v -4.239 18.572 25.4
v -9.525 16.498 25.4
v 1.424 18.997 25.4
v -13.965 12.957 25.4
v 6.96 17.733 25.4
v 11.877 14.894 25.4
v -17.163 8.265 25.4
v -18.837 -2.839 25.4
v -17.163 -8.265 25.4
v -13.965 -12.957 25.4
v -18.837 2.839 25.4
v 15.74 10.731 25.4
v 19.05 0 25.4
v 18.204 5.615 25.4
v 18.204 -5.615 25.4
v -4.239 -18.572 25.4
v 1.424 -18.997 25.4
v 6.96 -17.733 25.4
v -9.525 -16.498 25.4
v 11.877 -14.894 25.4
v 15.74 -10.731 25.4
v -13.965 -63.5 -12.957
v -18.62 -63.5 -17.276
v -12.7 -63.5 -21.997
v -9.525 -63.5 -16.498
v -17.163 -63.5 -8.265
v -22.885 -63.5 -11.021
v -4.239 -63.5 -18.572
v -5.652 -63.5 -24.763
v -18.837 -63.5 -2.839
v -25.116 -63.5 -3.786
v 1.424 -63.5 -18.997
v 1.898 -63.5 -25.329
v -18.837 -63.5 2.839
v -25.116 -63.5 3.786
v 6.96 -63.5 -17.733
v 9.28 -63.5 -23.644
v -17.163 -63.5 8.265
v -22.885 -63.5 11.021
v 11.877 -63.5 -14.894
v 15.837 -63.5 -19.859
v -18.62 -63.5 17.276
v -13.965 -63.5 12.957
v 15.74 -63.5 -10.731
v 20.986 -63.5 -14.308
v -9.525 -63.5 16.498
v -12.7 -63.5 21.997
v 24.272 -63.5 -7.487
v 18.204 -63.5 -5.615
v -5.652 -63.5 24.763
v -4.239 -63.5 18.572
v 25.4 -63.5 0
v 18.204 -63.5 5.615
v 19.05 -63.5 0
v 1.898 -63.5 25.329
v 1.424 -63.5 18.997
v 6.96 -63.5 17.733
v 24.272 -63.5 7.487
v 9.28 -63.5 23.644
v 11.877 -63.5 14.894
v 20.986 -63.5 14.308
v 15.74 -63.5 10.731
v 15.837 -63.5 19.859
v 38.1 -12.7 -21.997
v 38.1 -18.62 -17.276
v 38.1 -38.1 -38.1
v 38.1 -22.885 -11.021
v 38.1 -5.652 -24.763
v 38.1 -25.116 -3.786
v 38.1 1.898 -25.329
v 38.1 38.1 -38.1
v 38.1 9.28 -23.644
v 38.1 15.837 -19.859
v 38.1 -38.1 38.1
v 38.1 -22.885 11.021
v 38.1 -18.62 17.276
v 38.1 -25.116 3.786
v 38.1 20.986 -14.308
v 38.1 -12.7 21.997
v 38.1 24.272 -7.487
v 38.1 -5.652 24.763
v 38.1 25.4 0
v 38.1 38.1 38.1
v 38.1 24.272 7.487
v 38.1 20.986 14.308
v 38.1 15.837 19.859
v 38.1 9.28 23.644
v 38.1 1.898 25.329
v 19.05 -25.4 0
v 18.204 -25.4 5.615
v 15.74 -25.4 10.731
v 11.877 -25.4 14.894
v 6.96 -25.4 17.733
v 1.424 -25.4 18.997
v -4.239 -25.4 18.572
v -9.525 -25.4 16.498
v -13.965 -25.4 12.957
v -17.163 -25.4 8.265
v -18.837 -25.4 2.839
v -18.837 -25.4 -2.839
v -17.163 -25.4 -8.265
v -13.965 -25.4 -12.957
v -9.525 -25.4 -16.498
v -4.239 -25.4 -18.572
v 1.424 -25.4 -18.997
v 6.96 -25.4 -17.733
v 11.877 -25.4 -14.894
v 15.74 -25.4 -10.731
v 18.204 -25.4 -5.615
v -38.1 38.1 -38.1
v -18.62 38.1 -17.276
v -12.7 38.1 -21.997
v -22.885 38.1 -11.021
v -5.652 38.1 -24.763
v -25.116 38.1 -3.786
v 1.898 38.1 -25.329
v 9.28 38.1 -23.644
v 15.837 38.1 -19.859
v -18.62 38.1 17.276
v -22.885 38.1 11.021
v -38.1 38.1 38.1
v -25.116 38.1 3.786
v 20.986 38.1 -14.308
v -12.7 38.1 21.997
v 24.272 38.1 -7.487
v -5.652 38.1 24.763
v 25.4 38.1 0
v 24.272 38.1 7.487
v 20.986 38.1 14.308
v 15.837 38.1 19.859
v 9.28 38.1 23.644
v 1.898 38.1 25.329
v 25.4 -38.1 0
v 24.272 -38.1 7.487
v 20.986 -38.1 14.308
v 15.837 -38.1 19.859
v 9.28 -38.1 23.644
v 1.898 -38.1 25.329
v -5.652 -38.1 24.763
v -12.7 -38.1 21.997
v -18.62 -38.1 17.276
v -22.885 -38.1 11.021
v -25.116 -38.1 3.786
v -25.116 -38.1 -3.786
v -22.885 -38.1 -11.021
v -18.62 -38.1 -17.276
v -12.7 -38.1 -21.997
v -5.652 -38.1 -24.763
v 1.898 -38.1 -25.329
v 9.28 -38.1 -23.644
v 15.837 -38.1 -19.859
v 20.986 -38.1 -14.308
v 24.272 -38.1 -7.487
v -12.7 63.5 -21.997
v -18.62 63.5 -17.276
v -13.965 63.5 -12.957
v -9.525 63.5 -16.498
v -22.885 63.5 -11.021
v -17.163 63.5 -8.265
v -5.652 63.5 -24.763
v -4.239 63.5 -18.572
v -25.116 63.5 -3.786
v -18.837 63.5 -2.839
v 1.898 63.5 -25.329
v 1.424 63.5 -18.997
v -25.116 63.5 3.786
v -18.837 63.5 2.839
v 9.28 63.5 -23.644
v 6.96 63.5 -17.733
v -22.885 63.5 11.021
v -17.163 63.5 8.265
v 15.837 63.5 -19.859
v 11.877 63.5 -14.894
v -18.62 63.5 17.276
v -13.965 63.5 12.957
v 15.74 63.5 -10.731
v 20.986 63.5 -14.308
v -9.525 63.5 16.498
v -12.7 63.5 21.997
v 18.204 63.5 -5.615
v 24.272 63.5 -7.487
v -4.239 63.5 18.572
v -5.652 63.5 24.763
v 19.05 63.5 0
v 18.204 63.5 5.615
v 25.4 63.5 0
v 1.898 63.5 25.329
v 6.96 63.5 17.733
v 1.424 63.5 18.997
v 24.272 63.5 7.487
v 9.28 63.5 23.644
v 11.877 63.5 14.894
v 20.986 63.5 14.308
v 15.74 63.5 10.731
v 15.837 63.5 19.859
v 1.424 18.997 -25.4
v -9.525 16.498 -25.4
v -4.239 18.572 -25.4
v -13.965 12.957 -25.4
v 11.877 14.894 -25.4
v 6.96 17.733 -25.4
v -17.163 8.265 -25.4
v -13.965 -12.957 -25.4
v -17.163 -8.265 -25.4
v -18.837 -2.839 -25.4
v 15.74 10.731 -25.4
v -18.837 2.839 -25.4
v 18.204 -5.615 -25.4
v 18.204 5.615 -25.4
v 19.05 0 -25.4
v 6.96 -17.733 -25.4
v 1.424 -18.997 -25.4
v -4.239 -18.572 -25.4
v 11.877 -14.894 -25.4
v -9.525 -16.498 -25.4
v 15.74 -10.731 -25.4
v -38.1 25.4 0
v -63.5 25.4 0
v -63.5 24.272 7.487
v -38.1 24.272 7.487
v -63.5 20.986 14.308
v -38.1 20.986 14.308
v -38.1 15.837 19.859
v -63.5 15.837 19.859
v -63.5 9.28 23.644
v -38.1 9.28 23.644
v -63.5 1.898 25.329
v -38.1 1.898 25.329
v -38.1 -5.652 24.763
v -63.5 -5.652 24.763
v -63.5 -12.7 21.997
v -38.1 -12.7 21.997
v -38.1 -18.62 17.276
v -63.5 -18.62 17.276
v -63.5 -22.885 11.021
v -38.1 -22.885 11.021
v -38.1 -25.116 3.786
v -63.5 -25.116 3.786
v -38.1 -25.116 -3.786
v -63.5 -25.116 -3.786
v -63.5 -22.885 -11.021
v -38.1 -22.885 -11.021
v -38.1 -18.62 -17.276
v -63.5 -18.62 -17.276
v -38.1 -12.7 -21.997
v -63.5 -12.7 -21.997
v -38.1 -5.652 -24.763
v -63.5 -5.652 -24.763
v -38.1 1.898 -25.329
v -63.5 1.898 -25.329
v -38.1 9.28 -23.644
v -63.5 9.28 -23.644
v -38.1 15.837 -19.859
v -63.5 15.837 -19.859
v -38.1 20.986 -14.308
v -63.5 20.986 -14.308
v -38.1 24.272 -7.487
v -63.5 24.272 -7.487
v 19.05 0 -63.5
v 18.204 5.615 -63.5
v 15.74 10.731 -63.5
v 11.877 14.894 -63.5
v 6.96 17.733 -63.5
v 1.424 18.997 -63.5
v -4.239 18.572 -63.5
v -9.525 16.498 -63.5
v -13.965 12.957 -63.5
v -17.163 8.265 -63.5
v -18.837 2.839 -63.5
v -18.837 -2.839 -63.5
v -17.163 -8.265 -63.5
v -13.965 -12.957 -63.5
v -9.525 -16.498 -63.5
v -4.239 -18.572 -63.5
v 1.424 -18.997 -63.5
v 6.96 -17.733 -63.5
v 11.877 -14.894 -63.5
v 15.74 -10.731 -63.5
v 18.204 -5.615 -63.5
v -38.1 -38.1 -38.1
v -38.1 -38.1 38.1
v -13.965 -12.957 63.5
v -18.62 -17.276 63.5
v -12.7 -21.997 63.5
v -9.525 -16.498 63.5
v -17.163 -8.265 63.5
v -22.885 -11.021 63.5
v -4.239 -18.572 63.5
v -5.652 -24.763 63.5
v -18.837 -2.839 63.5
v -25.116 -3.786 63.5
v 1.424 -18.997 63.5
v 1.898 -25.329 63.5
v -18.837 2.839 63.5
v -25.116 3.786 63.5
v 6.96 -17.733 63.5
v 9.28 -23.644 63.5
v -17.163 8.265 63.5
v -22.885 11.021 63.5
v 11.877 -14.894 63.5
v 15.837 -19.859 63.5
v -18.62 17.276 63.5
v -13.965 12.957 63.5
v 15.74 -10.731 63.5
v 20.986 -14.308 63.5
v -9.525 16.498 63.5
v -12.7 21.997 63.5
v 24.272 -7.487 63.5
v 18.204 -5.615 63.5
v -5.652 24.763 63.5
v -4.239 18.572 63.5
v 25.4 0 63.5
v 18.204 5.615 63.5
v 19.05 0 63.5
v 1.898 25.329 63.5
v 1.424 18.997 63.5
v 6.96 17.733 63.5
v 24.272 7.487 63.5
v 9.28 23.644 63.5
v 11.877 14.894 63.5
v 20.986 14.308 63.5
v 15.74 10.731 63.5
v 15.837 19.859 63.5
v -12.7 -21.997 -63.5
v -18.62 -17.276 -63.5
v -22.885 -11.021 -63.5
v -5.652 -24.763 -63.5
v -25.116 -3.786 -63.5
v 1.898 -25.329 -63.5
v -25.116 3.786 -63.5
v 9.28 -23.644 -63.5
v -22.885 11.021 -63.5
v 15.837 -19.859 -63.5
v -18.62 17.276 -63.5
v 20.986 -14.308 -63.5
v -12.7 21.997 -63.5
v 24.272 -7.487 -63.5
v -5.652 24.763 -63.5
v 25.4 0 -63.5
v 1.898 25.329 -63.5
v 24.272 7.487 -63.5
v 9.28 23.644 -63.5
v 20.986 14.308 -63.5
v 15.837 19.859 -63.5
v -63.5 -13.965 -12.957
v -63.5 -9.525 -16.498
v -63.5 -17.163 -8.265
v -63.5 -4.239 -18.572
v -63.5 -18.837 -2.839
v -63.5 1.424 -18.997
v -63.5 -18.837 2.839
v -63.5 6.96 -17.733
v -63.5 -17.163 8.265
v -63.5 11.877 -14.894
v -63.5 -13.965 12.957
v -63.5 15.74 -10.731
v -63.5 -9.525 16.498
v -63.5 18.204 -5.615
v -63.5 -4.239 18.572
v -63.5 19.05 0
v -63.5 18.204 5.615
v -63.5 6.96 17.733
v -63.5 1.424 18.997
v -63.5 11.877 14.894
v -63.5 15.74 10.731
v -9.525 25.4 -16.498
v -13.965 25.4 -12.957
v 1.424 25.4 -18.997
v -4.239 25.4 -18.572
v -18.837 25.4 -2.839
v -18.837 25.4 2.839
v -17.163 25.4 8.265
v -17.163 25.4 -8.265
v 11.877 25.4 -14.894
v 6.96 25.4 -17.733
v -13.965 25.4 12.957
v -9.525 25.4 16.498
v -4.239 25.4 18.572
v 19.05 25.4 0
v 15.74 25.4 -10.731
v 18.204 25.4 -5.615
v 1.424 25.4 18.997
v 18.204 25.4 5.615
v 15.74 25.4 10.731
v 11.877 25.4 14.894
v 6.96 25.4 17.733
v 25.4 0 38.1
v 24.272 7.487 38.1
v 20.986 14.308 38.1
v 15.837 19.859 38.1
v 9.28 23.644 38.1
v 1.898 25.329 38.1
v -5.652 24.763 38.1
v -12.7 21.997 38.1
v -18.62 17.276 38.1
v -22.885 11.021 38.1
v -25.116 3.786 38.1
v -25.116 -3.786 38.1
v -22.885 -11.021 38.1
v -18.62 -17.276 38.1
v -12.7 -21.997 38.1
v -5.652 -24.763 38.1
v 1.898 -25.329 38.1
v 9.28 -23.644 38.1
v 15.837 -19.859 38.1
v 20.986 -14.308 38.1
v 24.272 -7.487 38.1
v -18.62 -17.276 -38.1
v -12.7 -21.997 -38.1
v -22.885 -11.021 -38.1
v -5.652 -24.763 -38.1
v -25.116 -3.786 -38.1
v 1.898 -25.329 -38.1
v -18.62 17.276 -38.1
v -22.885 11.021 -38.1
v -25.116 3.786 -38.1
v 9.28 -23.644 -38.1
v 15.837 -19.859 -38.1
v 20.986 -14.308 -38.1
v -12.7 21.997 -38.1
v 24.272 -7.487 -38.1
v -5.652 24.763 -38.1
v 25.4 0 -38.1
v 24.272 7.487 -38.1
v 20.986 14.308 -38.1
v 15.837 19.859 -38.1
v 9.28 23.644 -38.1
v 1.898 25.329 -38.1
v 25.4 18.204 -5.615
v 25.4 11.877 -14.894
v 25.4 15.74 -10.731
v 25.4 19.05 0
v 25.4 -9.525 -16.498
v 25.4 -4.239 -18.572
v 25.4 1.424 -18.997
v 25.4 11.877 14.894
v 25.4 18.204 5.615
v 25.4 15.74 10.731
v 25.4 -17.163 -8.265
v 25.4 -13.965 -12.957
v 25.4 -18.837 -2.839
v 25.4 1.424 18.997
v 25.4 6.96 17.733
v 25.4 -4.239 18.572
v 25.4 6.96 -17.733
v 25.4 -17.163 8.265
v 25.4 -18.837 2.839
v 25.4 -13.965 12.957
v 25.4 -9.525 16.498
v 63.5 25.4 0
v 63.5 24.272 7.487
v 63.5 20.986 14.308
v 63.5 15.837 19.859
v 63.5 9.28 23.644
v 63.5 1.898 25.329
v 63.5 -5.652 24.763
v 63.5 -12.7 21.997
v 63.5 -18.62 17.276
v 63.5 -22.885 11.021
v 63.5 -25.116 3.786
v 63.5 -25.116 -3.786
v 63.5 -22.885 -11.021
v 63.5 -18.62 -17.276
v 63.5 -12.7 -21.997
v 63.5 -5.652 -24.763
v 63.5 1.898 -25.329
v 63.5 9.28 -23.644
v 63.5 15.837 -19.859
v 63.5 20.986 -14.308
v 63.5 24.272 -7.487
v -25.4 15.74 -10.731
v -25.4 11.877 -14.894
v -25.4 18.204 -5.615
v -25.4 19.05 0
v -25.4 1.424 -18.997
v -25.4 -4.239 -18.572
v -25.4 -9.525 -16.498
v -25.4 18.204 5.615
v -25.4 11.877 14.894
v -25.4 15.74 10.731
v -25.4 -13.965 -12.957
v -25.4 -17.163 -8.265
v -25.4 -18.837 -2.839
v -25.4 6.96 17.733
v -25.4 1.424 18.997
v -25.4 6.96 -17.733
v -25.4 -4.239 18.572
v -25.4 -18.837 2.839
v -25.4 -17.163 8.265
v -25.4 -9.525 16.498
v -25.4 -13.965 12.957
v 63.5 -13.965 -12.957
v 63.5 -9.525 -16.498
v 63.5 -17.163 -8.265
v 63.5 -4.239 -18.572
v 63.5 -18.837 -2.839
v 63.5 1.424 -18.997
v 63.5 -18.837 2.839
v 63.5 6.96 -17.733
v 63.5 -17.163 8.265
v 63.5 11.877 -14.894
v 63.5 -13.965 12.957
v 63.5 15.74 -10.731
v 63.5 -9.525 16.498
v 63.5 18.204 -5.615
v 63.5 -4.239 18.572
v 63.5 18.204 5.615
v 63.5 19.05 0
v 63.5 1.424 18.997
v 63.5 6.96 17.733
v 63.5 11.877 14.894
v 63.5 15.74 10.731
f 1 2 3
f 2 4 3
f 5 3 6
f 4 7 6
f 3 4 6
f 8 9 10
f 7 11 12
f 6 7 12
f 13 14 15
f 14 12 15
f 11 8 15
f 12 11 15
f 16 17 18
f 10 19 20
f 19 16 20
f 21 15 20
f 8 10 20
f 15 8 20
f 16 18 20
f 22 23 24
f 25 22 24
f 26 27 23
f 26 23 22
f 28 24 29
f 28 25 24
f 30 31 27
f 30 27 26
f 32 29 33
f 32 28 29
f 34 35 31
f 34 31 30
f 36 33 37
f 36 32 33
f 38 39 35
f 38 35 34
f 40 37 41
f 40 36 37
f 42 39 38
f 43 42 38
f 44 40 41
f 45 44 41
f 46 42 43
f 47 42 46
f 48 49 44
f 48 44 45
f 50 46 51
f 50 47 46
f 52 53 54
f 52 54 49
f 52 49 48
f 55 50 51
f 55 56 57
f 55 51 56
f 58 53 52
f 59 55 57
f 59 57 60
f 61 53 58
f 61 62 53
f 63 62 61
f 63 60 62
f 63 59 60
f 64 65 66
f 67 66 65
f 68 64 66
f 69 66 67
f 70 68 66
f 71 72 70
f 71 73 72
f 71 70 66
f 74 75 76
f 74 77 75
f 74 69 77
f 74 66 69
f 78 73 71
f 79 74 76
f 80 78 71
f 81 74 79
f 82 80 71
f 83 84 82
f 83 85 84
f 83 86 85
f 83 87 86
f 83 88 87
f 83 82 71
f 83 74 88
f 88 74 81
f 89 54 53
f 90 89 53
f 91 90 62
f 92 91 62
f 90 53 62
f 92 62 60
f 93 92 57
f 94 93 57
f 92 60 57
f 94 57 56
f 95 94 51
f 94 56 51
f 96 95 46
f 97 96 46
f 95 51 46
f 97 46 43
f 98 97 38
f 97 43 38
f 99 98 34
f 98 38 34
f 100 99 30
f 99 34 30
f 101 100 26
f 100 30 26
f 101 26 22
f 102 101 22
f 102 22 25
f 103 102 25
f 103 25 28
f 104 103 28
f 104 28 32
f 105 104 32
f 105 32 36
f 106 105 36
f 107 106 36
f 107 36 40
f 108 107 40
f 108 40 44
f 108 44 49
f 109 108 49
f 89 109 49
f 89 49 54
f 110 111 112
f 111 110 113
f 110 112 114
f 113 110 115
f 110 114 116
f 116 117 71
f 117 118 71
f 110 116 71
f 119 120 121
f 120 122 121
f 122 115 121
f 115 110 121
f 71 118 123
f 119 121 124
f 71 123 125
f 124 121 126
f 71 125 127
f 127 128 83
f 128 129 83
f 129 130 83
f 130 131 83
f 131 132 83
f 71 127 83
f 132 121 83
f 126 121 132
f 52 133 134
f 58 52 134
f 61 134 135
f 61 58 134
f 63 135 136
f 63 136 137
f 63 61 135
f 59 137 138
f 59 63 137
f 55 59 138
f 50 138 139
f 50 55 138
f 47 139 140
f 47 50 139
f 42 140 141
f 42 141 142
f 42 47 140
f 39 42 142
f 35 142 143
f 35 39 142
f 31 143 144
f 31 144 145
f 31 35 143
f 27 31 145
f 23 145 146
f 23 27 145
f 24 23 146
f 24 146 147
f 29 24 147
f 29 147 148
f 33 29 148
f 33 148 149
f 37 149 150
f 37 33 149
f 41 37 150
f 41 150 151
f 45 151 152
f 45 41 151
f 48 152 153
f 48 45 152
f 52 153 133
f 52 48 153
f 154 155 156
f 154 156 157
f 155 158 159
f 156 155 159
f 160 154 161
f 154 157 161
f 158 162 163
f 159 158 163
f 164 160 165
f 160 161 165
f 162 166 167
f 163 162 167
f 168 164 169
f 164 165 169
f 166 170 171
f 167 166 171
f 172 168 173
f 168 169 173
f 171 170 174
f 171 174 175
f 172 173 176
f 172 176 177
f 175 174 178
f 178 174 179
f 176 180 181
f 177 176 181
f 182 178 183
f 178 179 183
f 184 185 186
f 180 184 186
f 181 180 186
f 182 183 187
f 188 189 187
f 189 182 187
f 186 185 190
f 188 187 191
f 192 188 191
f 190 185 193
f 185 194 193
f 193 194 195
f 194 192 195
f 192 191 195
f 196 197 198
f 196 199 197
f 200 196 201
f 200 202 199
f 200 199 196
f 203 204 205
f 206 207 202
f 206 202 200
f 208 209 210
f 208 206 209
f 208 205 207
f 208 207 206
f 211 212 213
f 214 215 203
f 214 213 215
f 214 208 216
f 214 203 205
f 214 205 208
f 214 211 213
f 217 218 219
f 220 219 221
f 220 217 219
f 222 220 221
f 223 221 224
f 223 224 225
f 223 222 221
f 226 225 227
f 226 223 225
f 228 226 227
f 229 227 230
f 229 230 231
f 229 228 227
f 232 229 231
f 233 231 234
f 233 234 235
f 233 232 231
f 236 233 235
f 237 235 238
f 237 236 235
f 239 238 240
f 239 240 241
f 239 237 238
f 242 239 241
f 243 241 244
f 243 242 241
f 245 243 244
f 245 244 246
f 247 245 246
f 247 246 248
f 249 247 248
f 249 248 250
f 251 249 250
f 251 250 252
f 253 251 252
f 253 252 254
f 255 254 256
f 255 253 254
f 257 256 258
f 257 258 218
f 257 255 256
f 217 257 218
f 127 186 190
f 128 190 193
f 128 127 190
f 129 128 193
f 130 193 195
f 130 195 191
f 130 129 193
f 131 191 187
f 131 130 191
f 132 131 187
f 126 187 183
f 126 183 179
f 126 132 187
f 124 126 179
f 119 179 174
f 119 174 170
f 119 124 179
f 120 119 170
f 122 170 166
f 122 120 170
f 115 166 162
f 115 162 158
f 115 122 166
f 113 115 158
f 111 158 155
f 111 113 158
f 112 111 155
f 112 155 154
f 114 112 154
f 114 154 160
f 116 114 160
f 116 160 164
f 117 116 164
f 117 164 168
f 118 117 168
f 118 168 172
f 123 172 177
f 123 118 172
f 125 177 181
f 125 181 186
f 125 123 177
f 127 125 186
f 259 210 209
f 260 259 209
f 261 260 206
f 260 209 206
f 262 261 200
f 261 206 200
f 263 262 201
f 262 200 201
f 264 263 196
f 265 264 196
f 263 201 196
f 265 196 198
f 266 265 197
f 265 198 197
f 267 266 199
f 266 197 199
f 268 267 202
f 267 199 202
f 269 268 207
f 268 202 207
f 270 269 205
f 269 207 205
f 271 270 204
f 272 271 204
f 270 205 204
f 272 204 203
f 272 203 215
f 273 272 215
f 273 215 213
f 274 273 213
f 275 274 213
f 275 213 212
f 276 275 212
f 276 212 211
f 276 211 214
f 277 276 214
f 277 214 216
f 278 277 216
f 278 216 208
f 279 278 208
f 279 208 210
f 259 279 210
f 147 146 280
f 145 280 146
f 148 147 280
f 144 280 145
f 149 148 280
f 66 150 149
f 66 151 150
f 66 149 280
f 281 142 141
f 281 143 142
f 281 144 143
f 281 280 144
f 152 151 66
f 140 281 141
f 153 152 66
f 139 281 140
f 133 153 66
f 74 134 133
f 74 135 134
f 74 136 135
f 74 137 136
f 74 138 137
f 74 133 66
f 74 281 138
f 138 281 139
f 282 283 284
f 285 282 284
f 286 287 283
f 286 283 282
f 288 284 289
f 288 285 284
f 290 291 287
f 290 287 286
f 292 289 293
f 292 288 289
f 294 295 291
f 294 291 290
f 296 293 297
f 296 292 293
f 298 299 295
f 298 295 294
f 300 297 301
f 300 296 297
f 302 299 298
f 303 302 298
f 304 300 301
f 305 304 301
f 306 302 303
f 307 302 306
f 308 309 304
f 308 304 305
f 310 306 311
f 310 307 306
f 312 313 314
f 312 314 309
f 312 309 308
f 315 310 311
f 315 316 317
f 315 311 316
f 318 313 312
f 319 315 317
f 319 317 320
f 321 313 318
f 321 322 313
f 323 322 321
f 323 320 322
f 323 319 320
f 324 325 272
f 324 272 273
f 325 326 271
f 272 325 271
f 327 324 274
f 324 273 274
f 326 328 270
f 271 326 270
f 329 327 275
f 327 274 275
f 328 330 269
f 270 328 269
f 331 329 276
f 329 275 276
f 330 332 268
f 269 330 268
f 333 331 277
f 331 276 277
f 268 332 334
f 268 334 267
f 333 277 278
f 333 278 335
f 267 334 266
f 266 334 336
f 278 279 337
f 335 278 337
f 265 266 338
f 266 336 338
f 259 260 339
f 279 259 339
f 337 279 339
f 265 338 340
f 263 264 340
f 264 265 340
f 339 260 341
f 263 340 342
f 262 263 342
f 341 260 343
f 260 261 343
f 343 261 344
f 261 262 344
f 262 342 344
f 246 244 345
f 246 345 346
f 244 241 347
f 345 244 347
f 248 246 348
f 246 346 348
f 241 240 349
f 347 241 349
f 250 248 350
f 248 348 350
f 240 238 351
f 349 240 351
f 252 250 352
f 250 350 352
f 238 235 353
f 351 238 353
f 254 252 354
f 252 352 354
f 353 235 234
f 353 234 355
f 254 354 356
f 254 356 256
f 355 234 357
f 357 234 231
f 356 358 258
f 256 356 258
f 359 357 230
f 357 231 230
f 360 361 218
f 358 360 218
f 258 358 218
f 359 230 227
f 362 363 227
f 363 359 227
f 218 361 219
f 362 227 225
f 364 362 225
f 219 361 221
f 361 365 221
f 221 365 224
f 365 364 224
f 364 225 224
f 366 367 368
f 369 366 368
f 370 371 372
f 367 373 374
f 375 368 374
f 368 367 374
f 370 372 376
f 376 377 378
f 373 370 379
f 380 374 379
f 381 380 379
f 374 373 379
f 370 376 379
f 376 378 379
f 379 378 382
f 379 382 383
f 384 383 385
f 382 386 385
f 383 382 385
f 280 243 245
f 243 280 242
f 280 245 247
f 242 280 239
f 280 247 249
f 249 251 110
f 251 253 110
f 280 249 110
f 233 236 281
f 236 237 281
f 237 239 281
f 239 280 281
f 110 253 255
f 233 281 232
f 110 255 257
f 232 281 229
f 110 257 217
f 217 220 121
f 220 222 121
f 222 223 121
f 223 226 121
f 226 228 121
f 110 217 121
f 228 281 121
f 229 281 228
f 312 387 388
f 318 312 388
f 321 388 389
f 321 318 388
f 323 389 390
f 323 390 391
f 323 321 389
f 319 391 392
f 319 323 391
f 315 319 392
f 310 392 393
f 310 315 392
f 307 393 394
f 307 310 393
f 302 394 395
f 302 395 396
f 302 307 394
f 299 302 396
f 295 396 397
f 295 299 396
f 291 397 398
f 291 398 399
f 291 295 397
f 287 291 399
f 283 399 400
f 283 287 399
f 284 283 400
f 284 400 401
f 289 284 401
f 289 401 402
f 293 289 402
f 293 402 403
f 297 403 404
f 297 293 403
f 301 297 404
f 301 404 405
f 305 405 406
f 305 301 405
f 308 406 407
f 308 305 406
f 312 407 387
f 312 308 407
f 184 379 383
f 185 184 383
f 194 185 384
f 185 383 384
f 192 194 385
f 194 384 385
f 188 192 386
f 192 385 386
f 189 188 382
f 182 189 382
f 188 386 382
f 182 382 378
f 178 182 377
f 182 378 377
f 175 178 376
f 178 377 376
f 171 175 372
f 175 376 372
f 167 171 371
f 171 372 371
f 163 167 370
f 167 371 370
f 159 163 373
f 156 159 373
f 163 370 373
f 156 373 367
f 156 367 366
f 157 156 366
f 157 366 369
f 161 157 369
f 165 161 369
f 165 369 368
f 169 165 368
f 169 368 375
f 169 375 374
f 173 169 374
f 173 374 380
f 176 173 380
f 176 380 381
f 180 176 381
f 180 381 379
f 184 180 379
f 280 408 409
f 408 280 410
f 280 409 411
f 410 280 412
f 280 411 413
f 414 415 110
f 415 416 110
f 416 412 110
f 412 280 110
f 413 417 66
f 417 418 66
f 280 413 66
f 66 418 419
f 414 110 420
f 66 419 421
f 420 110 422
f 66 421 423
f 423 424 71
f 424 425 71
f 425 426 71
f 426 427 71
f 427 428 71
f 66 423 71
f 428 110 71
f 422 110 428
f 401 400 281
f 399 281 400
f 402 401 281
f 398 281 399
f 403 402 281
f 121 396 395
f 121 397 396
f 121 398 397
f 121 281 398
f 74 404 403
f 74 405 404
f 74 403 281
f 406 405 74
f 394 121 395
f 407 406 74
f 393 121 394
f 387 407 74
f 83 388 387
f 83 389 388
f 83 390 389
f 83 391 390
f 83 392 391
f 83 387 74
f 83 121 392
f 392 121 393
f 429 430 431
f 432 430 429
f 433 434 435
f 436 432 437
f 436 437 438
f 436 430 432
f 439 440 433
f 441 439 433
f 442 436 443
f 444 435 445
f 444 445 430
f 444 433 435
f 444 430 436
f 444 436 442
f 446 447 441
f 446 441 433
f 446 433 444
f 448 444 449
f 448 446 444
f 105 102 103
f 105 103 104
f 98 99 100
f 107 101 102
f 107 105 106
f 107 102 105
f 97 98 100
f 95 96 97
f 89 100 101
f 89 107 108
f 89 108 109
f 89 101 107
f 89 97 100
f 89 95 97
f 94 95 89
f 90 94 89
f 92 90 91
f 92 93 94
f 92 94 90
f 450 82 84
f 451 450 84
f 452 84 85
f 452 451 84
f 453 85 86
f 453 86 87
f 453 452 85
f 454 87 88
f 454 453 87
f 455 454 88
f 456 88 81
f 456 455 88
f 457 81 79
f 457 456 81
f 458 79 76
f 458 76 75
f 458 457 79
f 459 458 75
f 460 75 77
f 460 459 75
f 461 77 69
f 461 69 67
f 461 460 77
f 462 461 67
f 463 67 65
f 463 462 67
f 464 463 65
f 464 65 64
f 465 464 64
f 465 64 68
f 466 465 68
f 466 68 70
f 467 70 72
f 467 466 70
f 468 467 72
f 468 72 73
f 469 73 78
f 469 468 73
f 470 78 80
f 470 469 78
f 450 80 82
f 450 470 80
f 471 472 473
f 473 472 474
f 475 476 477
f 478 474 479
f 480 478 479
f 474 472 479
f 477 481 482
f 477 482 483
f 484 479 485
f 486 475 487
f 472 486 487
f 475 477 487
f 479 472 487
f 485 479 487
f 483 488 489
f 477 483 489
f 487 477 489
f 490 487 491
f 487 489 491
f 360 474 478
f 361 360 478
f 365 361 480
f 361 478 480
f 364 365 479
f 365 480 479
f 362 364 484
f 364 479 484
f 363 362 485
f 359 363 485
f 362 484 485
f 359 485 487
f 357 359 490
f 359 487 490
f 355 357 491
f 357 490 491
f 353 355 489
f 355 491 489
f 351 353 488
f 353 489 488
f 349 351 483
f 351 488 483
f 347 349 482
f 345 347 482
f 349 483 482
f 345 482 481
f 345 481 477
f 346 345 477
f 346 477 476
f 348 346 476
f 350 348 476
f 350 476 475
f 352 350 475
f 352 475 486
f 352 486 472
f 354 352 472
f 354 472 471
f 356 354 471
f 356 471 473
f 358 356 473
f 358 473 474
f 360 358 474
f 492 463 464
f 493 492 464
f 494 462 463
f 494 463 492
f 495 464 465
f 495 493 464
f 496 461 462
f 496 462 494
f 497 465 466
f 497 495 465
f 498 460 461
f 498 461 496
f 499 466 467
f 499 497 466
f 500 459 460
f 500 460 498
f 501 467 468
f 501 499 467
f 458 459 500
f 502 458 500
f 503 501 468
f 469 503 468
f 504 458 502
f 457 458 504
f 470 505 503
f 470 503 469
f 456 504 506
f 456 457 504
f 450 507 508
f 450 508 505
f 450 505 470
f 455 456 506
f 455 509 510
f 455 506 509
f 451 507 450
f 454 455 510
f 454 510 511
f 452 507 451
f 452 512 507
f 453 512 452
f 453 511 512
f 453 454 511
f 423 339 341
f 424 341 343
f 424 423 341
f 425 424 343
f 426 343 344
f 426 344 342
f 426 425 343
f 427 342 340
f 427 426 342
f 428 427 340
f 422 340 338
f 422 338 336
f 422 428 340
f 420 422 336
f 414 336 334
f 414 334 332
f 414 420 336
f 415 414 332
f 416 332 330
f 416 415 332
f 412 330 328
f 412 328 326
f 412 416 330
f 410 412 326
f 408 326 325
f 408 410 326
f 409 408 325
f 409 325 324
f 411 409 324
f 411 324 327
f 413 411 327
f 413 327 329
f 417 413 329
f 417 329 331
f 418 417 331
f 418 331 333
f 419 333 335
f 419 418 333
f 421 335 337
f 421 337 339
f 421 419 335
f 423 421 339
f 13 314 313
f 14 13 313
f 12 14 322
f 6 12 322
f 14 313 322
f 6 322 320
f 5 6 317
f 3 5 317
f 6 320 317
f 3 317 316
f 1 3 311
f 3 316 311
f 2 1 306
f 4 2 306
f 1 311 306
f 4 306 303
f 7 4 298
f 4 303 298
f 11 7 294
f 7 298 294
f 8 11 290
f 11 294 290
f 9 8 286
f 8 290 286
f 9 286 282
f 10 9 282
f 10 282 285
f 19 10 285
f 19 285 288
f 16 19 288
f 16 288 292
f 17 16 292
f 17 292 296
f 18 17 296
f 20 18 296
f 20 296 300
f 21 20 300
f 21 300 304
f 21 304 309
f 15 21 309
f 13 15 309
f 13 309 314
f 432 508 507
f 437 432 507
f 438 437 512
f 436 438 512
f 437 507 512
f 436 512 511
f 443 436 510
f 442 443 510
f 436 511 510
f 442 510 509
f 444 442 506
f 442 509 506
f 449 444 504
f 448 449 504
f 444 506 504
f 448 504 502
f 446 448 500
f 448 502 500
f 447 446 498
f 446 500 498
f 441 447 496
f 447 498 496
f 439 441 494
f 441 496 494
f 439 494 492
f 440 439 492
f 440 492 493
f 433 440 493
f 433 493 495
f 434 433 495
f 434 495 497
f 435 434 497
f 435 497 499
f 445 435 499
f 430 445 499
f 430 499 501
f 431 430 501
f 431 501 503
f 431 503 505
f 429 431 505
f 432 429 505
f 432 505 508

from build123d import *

# Parameters (mm, degrees)
F0_W      = 76.2
F0_H      = 76.2
F0_R      = 25.4
F1_DEPTH  = 38.1
F2_DEPTH  = 63.5
F3_R      = 25.4
F4_DEPTH  = 63.5
F5_R      = 25.4
F6_DEPTH  = 63.5
F7_R      = 19.05
F8_DEPTH  = 127.001
F9_R      = 19.05
F10_DEPTH = 127.001
F11_R     = 19.05
F12_DEPTH = 127.001
F13_W     = 50.8
F13_H     = 50.8
F14_DEPTH = 25.4


with BuildPart() as f1:
    # F0 (on Top) → F1 (new body, symmetric)
    with BuildSketch(Plane.XY):
        Rectangle(F0_W, F0_H)
        Circle(F0_R, mode=Mode.SUBTRACT)
    extrude(amount=F1_DEPTH, both=True)

    # F0 (on Top) → F2 (join, symmetric)
    with BuildSketch(Plane.XY):
        Circle(F0_R)
    extrude(amount=F2_DEPTH, both=True)

    # F3 (on Front) → F4 (join, symmetric)
    with BuildSketch(Plane.XZ):
        Circle(F3_R)
    extrude(amount=F4_DEPTH, both=True)

    # F5 (on Right) → F6 (join, symmetric)
    with BuildSketch(Plane.YZ):
        Circle(F5_R)
    extrude(amount=F6_DEPTH, both=True)

    # F7 (on face) → F8 (cut, through all)
    with BuildSketch(Plane.XY.offset(63.5)):
        Circle(F7_R)
    extrude(amount=-F8_DEPTH, mode=Mode.SUBTRACT)

    # F9 (on face) → F10 (cut, through all)
    with BuildSketch(Plane.XZ.offset(63.5)):
        Circle(F9_R)
    extrude(amount=-F10_DEPTH, mode=Mode.SUBTRACT)

    # F11 (on face) → F12 (cut, through all)
    with BuildSketch(Plane.YZ.offset(63.5)):
        Circle(F11_R)
    extrude(amount=-F12_DEPTH, mode=Mode.SUBTRACT)

    # F13 (on Front) → F14 (join, symmetric)
    with BuildSketch(Plane.XZ):
        Rectangle(F13_W, F13_H)
    extrude(amount=F14_DEPTH, both=True)


solid = f1.part
